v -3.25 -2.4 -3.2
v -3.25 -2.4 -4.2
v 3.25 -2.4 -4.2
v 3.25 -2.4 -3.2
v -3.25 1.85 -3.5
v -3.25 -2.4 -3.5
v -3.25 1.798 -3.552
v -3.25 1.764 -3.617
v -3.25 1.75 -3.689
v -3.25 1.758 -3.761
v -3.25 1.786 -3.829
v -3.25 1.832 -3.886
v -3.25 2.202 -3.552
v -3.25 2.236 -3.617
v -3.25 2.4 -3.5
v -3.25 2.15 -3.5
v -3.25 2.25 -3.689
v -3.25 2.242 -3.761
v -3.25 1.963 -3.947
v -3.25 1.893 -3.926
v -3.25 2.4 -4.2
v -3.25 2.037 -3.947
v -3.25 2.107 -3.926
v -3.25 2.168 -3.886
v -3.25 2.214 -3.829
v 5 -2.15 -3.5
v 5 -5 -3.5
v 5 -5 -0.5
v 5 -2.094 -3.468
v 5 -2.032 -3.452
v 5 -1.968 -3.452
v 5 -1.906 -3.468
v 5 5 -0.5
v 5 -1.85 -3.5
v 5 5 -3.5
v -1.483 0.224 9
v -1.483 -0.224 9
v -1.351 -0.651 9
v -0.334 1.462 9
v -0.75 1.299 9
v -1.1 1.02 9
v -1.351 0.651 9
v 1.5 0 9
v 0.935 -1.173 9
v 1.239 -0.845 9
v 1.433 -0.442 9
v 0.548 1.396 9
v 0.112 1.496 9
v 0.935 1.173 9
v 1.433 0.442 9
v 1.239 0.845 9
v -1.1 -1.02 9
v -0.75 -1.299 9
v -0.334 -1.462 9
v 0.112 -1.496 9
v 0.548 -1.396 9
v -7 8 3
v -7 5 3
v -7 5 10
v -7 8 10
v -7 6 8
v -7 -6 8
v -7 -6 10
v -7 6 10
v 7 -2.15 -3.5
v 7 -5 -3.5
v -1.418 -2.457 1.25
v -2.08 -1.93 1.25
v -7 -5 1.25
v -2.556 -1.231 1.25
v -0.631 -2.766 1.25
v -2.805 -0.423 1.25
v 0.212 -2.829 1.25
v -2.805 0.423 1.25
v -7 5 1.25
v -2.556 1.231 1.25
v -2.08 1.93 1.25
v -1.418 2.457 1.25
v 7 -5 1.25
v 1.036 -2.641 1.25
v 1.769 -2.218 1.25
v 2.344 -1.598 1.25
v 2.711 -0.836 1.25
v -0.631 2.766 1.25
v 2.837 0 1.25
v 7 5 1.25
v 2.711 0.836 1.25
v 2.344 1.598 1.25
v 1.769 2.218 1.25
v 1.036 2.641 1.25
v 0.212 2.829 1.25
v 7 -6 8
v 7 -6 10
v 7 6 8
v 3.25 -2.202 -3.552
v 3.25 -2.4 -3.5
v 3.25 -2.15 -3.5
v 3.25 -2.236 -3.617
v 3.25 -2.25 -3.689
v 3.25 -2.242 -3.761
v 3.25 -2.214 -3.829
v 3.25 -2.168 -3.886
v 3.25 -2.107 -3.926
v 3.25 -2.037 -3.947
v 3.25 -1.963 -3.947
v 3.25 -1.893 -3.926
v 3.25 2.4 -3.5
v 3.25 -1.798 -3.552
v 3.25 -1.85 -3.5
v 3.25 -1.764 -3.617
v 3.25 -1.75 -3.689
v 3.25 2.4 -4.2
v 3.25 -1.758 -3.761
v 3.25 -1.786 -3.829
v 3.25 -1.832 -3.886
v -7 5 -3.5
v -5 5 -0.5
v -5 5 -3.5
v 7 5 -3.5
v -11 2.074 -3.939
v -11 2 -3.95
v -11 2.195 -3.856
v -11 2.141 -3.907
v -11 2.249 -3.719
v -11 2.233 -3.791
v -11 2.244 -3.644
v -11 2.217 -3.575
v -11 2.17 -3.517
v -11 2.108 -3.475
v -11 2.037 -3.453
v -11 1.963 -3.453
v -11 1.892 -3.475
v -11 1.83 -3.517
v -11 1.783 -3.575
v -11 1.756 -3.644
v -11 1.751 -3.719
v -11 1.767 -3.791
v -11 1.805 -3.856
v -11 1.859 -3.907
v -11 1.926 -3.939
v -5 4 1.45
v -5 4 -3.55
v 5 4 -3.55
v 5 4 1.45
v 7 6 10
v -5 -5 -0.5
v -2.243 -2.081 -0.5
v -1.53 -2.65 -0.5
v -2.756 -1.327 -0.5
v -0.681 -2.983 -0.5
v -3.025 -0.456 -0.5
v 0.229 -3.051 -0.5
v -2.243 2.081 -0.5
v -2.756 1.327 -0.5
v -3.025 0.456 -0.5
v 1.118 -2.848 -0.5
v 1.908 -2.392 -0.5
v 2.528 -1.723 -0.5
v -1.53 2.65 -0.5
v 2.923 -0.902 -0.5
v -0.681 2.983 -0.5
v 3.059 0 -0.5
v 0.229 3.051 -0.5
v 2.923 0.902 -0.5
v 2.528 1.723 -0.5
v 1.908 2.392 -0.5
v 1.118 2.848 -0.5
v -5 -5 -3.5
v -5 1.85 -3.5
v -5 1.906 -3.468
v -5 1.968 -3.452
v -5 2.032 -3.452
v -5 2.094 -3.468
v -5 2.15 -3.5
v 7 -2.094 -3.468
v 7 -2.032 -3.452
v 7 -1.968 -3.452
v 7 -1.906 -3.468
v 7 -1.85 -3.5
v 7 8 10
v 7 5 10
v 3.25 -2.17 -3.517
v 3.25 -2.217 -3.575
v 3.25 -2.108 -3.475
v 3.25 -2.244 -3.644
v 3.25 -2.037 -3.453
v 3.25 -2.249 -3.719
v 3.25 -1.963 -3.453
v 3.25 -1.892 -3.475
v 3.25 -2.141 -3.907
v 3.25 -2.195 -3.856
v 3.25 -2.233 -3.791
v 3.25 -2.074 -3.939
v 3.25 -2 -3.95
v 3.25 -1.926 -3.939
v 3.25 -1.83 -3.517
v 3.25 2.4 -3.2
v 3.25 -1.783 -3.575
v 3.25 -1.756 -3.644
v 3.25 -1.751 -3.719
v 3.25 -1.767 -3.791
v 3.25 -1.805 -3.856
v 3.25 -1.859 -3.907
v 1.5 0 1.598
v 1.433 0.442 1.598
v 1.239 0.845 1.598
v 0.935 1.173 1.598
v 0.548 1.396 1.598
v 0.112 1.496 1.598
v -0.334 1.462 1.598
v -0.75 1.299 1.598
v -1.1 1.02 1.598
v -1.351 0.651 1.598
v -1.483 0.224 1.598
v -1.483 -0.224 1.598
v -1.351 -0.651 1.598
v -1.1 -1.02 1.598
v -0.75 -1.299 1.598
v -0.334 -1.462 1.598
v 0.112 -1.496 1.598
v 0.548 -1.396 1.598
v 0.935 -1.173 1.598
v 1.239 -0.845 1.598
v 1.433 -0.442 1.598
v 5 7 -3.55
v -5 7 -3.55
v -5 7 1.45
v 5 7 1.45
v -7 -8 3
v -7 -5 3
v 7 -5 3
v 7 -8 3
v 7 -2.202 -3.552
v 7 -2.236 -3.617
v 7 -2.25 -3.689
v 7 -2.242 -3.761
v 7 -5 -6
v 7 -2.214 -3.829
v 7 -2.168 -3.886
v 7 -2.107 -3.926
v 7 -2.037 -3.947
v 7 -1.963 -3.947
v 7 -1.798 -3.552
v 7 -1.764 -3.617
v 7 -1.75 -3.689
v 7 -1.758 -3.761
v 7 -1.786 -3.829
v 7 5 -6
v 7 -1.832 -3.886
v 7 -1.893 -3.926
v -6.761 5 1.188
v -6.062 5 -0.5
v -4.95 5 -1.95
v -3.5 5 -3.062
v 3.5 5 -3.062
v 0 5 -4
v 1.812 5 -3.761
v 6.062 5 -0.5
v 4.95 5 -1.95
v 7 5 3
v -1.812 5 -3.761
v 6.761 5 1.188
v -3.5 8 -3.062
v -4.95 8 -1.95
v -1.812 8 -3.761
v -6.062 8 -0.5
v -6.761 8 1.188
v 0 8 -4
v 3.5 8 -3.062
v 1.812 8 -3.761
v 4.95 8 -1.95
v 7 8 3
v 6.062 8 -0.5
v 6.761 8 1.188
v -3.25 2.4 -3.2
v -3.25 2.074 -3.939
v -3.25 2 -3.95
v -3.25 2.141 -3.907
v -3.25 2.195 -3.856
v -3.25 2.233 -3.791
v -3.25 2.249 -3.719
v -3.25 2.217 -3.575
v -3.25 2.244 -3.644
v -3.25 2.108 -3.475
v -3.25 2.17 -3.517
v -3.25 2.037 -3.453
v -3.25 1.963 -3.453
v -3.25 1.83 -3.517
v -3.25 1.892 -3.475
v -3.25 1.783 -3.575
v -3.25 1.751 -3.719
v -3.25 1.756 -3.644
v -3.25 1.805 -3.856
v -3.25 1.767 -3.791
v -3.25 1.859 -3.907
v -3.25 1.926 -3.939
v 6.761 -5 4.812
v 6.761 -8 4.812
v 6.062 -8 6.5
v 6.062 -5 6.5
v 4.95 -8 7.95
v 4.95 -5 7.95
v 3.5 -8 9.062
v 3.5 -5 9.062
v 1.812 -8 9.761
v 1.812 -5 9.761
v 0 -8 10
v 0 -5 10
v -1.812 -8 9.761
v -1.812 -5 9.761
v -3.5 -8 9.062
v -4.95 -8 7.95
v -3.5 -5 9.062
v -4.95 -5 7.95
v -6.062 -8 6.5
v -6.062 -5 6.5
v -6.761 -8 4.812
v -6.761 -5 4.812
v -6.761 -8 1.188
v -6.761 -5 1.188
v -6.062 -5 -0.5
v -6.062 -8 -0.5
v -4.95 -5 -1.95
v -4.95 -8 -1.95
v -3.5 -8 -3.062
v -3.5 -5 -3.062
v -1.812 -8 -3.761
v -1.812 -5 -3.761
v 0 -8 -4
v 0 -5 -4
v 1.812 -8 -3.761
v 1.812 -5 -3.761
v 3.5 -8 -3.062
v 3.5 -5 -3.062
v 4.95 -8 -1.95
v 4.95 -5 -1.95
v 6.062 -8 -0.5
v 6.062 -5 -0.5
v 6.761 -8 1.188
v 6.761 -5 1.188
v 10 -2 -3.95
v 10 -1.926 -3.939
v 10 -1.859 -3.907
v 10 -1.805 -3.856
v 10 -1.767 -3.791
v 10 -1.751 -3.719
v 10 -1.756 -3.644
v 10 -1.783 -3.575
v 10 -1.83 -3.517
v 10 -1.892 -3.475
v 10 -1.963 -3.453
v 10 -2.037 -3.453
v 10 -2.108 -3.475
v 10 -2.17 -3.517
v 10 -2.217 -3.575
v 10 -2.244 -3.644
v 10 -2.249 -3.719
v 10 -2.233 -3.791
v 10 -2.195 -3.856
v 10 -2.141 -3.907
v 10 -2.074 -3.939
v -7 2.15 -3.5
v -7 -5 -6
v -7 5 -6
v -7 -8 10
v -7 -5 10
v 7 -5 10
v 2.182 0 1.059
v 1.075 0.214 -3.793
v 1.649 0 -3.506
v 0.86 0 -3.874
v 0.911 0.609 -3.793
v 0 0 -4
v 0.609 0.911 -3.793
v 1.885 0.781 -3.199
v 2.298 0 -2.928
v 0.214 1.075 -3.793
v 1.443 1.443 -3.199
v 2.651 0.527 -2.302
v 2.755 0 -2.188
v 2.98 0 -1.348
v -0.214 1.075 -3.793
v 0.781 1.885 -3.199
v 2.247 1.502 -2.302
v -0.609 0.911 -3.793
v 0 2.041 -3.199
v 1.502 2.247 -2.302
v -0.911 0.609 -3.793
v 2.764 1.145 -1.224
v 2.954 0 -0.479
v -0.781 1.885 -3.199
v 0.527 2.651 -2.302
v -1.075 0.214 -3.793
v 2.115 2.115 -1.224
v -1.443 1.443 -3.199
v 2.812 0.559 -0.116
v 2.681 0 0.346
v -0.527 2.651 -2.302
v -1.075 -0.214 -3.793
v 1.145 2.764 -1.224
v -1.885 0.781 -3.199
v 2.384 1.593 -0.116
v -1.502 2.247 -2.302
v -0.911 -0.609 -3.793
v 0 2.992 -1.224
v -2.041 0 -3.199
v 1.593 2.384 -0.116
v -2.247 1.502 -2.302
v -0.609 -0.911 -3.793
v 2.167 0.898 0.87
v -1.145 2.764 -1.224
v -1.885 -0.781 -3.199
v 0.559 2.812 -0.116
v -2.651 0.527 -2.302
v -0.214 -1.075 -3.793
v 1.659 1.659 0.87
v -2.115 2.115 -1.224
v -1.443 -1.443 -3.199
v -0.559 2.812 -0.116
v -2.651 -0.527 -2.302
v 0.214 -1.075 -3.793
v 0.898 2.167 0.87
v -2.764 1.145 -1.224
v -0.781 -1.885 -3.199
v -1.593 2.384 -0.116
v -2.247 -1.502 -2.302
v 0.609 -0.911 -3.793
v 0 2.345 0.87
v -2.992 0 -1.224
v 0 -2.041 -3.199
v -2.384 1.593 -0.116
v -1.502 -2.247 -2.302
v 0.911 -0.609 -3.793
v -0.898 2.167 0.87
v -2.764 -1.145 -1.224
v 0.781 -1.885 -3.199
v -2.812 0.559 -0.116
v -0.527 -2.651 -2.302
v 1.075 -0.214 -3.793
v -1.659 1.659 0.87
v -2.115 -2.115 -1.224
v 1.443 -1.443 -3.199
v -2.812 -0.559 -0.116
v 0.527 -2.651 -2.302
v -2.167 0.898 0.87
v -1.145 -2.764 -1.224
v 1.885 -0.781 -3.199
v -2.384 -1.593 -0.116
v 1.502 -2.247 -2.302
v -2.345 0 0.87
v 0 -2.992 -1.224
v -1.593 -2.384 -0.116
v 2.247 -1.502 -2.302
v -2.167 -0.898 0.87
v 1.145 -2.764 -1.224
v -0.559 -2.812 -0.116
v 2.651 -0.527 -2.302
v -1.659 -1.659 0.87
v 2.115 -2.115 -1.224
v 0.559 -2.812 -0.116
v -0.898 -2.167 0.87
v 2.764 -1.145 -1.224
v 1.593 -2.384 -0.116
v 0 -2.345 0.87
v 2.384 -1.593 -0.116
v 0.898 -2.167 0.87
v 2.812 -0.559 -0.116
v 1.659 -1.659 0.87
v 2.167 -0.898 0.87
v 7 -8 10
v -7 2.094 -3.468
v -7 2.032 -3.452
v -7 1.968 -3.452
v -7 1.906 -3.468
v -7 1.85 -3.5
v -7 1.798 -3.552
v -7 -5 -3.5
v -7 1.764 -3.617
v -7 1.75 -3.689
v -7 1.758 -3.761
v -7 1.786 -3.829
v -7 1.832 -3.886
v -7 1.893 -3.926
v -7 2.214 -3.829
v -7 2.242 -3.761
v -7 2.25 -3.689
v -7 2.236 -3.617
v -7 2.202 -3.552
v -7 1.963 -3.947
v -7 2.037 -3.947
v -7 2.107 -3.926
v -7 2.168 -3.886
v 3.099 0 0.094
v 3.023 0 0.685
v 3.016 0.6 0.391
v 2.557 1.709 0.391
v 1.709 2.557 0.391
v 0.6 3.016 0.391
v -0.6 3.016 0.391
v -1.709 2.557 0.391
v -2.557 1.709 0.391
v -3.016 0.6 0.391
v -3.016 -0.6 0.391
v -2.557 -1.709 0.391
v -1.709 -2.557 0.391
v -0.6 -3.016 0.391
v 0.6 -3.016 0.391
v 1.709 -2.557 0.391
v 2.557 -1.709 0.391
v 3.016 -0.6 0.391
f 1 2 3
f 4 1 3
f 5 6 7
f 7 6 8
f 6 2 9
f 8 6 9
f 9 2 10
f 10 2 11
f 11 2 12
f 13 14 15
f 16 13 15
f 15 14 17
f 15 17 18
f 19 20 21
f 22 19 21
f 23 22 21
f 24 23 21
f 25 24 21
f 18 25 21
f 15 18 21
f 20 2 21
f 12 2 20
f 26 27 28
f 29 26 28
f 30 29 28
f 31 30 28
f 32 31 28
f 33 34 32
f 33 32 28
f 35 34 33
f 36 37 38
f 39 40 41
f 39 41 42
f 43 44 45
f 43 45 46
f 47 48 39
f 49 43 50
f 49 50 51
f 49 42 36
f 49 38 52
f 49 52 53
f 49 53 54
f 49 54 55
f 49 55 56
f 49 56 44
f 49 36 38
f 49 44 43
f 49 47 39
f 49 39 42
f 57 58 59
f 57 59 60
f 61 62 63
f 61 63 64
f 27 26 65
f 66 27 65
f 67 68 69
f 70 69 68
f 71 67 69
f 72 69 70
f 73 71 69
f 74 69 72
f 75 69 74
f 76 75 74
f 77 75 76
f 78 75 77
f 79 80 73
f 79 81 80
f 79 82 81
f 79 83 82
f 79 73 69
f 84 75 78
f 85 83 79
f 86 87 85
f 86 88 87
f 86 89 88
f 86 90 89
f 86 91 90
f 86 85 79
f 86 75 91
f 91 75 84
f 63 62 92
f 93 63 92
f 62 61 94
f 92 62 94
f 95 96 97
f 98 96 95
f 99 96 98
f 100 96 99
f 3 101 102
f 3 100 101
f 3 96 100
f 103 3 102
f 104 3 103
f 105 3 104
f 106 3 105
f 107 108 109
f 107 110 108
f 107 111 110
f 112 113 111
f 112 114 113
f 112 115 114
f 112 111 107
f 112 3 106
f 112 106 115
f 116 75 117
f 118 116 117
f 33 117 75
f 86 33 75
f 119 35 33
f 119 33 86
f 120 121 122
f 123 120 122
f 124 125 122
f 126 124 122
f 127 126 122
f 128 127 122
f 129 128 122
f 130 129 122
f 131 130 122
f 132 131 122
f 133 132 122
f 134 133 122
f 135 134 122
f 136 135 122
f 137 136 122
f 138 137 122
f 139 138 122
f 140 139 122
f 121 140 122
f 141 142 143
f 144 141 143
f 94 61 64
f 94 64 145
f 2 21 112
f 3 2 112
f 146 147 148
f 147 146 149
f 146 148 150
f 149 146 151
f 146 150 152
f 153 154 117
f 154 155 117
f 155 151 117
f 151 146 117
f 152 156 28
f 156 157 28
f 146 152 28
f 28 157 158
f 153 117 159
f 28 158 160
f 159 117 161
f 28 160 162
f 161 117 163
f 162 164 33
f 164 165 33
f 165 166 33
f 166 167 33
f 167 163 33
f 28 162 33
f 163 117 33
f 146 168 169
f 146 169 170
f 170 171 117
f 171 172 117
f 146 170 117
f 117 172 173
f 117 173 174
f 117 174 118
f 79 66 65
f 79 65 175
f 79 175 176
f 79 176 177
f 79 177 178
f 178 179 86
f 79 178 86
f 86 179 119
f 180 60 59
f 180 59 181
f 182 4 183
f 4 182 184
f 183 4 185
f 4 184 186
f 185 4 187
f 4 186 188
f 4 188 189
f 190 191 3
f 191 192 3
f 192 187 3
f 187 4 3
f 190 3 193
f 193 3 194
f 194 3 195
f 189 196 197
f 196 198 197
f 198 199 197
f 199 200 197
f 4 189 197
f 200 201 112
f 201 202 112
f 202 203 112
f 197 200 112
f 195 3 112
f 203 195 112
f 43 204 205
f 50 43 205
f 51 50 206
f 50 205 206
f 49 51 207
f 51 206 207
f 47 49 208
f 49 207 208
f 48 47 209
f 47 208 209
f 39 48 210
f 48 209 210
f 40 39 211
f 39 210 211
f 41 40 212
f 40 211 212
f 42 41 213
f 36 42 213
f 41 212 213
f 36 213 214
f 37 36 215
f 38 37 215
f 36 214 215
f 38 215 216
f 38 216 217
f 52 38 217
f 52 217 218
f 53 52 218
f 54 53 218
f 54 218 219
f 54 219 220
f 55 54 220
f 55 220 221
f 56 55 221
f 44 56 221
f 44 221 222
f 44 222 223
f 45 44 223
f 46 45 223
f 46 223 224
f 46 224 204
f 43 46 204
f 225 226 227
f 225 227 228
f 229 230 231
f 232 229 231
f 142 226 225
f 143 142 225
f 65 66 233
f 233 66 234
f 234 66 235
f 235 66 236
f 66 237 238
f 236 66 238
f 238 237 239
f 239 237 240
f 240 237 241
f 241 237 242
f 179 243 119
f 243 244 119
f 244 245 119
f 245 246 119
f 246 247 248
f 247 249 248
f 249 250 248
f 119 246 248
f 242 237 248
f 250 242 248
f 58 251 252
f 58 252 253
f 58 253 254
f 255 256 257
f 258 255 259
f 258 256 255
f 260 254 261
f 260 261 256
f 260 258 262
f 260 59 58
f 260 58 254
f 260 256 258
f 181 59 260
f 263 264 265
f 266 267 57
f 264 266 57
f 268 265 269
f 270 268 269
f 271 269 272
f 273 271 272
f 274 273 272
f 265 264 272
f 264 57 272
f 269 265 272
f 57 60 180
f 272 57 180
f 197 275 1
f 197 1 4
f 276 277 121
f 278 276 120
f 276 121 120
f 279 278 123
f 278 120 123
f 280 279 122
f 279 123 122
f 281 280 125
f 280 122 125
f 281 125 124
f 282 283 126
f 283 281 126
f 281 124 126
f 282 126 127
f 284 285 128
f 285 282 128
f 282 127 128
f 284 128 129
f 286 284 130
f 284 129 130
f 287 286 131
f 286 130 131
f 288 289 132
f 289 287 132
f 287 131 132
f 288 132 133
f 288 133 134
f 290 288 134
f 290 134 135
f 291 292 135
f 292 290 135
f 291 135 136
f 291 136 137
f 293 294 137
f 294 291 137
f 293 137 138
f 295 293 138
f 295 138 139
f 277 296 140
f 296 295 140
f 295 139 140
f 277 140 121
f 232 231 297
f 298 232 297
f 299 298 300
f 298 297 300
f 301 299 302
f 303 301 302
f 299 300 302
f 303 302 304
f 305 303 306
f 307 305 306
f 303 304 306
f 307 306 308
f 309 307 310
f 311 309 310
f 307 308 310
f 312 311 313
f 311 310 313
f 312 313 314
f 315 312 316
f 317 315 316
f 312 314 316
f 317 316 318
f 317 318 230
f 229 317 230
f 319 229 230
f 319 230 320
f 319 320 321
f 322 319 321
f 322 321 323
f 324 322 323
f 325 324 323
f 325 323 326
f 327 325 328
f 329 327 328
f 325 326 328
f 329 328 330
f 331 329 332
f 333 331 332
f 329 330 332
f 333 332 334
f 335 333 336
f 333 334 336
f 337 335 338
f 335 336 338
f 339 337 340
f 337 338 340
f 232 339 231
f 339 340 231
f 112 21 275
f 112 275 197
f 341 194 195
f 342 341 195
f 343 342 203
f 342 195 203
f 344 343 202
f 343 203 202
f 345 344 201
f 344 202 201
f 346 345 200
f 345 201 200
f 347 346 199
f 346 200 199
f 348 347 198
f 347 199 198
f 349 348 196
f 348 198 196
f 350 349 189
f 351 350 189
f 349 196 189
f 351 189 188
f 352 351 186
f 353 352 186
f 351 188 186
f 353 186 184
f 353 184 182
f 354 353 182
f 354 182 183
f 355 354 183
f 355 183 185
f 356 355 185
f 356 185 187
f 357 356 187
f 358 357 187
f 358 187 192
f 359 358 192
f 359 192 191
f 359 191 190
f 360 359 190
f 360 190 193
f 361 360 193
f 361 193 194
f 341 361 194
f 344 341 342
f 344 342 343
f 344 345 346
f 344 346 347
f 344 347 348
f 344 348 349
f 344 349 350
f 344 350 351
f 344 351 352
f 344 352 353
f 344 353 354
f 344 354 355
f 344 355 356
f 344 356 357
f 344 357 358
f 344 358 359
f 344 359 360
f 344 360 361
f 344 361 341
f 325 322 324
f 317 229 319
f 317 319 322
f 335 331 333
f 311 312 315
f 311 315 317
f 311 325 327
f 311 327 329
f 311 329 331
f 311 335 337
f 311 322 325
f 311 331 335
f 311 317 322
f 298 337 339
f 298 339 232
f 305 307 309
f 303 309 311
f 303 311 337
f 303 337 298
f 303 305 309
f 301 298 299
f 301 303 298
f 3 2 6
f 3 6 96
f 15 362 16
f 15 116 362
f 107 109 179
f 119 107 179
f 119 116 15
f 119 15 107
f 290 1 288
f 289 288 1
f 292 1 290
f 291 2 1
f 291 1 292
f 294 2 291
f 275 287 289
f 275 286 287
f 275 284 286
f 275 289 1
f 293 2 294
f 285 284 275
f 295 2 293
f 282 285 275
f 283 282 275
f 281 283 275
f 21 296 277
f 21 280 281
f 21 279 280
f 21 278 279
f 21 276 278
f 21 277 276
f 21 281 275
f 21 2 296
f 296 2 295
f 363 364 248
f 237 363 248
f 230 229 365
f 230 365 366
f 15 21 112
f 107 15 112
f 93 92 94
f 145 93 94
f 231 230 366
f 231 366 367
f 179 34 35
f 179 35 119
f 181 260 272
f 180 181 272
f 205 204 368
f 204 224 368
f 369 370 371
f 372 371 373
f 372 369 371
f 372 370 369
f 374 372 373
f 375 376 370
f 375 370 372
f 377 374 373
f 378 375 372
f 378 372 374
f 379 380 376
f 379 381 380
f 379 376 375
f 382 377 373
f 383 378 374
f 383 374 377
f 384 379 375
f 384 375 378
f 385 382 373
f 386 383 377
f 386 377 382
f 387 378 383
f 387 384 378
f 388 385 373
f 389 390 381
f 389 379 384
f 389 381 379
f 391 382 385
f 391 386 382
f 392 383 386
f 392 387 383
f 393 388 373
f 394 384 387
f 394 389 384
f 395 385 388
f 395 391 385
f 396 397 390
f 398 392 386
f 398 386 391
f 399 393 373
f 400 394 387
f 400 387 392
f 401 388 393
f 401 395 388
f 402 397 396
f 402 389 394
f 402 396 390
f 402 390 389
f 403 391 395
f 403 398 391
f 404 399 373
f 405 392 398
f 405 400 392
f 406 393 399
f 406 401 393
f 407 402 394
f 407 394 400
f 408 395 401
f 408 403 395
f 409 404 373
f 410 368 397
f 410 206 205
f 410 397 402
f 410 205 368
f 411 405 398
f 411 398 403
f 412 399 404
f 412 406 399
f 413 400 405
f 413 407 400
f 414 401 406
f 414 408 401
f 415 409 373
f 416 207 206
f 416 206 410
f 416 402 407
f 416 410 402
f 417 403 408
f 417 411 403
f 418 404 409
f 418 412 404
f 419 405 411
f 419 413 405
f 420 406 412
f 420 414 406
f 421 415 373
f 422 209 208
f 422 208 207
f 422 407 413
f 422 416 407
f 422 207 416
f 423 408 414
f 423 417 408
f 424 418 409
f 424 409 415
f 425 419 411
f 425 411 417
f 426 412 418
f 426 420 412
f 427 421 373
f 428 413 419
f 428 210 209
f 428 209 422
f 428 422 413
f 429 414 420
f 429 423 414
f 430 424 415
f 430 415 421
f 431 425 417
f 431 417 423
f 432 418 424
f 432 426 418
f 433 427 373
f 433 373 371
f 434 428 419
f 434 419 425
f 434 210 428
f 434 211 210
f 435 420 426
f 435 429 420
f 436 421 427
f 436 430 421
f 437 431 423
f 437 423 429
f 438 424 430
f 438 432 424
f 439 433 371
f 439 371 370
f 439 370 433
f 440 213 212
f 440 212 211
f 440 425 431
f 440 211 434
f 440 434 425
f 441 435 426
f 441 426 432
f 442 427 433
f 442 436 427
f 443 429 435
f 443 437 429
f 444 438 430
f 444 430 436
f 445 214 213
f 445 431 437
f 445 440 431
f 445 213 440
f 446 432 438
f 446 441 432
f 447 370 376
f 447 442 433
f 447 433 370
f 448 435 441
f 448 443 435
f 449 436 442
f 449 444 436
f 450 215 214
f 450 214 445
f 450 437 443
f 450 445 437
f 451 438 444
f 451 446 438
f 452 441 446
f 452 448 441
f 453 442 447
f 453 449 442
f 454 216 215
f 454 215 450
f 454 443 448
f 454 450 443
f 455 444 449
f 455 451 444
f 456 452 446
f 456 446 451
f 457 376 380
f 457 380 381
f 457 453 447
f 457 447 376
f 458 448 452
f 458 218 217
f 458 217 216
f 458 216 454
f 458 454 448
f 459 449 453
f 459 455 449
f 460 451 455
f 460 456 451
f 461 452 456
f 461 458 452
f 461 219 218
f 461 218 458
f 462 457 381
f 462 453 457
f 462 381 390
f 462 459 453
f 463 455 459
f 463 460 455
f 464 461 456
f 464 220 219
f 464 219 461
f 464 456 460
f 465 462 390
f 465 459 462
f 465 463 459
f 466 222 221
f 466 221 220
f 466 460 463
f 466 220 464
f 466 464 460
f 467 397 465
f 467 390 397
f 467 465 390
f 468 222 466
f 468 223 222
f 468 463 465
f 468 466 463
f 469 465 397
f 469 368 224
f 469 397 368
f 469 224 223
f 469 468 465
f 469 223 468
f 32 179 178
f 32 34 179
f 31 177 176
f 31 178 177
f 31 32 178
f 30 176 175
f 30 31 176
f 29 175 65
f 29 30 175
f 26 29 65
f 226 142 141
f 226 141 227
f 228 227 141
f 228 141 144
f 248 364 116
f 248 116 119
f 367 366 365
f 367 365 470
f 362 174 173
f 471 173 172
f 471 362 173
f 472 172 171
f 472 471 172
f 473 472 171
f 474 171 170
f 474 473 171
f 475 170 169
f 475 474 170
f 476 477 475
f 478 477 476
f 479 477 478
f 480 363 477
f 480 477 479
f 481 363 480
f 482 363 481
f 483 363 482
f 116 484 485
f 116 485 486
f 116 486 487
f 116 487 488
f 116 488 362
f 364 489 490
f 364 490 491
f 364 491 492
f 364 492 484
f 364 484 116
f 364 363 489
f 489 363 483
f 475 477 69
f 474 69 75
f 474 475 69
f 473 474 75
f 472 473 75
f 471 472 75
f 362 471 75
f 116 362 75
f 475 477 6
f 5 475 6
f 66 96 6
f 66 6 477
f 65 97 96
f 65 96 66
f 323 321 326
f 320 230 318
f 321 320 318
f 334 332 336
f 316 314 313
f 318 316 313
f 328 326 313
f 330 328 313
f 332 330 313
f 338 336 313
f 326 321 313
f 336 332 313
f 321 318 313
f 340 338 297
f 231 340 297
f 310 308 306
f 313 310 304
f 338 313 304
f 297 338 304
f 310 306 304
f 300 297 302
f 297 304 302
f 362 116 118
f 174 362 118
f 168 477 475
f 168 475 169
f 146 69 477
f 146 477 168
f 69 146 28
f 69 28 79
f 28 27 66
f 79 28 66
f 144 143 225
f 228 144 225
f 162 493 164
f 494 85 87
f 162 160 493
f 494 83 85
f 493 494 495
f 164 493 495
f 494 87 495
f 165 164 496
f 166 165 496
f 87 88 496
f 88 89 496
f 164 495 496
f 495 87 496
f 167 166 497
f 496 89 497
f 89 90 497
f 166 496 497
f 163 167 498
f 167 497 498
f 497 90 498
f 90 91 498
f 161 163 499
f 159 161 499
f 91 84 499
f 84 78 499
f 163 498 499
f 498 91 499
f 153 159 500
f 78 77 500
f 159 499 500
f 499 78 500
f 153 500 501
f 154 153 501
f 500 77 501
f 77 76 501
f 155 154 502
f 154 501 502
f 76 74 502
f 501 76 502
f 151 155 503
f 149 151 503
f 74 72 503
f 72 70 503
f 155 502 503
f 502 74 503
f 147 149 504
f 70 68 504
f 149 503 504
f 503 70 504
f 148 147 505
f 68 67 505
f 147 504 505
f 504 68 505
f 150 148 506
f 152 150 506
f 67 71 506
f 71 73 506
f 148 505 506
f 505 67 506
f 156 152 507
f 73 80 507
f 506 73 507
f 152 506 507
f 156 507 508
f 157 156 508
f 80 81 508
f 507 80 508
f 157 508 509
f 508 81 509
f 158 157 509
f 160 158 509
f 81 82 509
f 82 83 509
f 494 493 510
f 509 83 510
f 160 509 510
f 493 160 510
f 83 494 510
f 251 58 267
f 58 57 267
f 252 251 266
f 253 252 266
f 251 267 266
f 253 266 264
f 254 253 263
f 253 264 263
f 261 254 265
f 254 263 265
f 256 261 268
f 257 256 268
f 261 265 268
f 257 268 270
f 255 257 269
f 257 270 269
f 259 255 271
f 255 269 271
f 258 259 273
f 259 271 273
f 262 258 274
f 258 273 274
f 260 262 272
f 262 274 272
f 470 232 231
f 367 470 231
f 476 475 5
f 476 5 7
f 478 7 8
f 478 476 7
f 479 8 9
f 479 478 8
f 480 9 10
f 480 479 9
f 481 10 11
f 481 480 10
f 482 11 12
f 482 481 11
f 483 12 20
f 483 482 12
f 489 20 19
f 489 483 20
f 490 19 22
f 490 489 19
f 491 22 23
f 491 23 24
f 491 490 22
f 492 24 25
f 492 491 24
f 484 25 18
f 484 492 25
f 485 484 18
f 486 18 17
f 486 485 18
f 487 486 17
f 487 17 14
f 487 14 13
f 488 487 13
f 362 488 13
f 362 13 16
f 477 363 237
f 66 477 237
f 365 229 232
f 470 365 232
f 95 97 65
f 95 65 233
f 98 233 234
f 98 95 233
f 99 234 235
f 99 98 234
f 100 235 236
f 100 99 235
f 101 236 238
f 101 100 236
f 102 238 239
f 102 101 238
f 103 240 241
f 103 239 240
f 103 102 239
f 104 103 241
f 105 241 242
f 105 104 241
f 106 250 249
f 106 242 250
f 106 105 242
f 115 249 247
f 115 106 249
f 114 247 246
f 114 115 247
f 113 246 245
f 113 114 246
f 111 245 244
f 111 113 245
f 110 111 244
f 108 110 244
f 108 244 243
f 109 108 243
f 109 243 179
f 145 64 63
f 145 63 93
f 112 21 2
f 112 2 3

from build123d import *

# Parameters (mm, degrees)
CYLINDER002_R           = 0.25
CYLINDER002_DEPTH       = 10
CYLINDER002_PITCH_ANGLE = 90
CYLINDER001_R           = 0.25
CYLINDER001_DEPTH       = 10
CYLINDER001_PITCH_ANGLE = 90
BOX_W                   = 6.5
BOX_H                   = 4.8
BOX_DEPTH               = 1
BOX004_W                = 10
BOX004_H                = 3
BOX004_DEPTH            = 5
CYLINDER_R              = 1.5
CYLINDER_DEPTH          = 10
BOX005_W                = 21
BOX005_H                = 17
BOX005_DEPTH            = 8
CYLINDER005_R           = 2.5
CYLINDER005_DEPTH       = 10
CYLINDER004_R           = 0.25
CYLINDER004_DEPTH       = 10
CYLINDER004_PITCH_ANGLE = 90
CYLINDER003_R           = 0.25
CYLINDER003_DEPTH       = 10
CYLINDER003_PITCH_ANGLE = 90
BOX002_W                = 6.5
BOX002_H                = 4.8
BOX002_DEPTH            = 1
BOX003_W                = 10
BOX003_H                = 12
BOX003_DEPTH            = 3
BOX001_W                = 14
BOX001_H                = 10
BOX001_DEPTH            = 7.25
BOX006_W                = 21
BOX006_H                = 17
BOX006_DEPTH            = 12
CYLINDER006_R           = 7
CYLINDER006_DEPTH       = 3
CYLINDER006_ROLL_ANGLE  = 90
BOX007_W                = 14
BOX007_H                = 3
BOX007_DEPTH            = 7
BOX008_W                = 14
BOX008_H                = 3
BOX008_DEPTH            = 7
CYLINDER007_R           = 7
CYLINDER007_DEPTH       = 3
CYLINDER007_ROLL_ANGLE  = 90
BOX009_W                = 14
BOX009_H                = 12
BOX009_DEPTH            = 2


with BuildPart() as cylinder002:
    # Cylinder002 → Cylinder002 (new body)
    with BuildSketch(Plane.XY):
        Circle(CYLINDER002_R)
    extrude(amount=CYLINDER002_DEPTH)


with BuildPart() as cylinder002_1:
    # Cylinder002 pitch: moved
    add(cylinder002.part.rotate(Axis((0, 0, 0), (0, 1, 0)), CYLINDER002_PITCH_ANGLE))


with BuildPart() as cylinder002_2:
    # Cylinder002 placement: moved
    add(cylinder002_1.part.moved(Location((0, -2, -3.7))))


with BuildPart() as fusion002:
    # Cylinder001 → Cylinder001 (new body)
    with BuildSketch(Plane.XY):
        Circle(CYLINDER001_R)
    extrude(amount=CYLINDER001_DEPTH)


with BuildPart() as fusion002_1:
    # Cylinder001 pitch: moved
    add(fusion002.part.rotate(Axis((0, 0, 0), (0, 1, 0)), CYLINDER001_PITCH_ANGLE))


with BuildPart() as fusion002_2:
    # Cylinder001 placement: moved
    add(fusion002_1.part.moved(Location((-11, 2, -3.7))))

    # Fusion002: union Cylinder002
    add(cylinder002_2.part)


with BuildPart() as switch:
    # Box → Box (new body)
    with BuildSketch(Plane(origin=(-3.25, -2.4, -4.2), x_dir=(1, 0, 0), z_dir=(0, 0, 1))):
        with Locations((3.25, 2.4)):
            Rectangle(BOX_W, BOX_H)
    extrude(amount=BOX_DEPTH)

    # Fusion003: union Fusion002
    add(fusion002_2.part)


with BuildPart() as cube004:
    # Box004 → Box004 (new body)
    with BuildSketch(Plane(origin=(-5, 4, -3.55), x_dir=(1, 0, 0), z_dir=(0, 0, 1))):
        with Locations((5, 1.5)):
            Rectangle(BOX004_W, BOX004_H)
    extrude(amount=BOX004_DEPTH)


with BuildPart() as cylinder:
    # Cylinder → Cylinder (new body)
    with BuildSketch(Plane.XY):
        Circle(CYLINDER_R)
    extrude(amount=CYLINDER_DEPTH)


with BuildPart() as ball_and_screw:
    # Sphere → Sphere (revolve)
    with BuildSketch(Plane.XZ):
        with BuildLine():
            ThreePointArc((0, -3), (3, 0), (0, 3))
            Line((0, 3), (0, -3))
        make_face()
    revolve(axis=Axis((0, 0, 0), (0, 0, 1)))

    # Fusion005: union Cylinder
    add(cylinder.part)


with BuildPart() as ball_and_screw_1:
    # Fusion005 placement: moved
    add(ball_and_screw.part.moved(Location((0, 0, -1))))


with BuildPart() as cube005:
    # Box005 → Box005 (new body)
    with BuildSketch(Plane(origin=(-9, -7, -3.5), x_dir=(1, 0, 0), z_dir=(0, 0, 1))):
        with Locations((10.5, 8.5)):
            Rectangle(BOX005_W, BOX005_H)
    extrude(amount=BOX005_DEPTH)


with BuildPart() as cylinder005:
    # Cylinder005 → Cylinder005 (new body)
    with BuildSketch(Plane.XY.offset(0.5)):
        Circle(CYLINDER005_R)
    extrude(amount=CYLINDER005_DEPTH)


with BuildPart() as fusion004:
    # Sphere001 → Sphere001 (revolve)
    with BuildSketch(Plane.XZ):
        with BuildLine():
            ThreePointArc((0, -3.1), (3.1, 0), (0, 3.1))
            Line((0, 3.1), (0, -3.1))
        make_face()
    revolve(axis=Axis((0, 0, 0), (0, 0, 1)))

    # Fusion004: union Cylinder005
    add(cylinder005.part)


with BuildPart() as cylinder004:
    # Cylinder004 → Cylinder004 (new body)
    with BuildSketch(Plane.XY):
        Circle(CYLINDER004_R)
    extrude(amount=CYLINDER004_DEPTH)


with BuildPart() as cylinder004_1:
    # Cylinder004 pitch: moved
    add(cylinder004.part.rotate(Axis((0, 0, 0), (0, 1, 0)), CYLINDER004_PITCH_ANGLE))


with BuildPart() as cylinder004_2:
    # Cylinder004 placement: moved
    add(cylinder004_1.part.moved(Location((0, -2, -3.7))))


with BuildPart() as fusion:
    # Cylinder003 → Cylinder003 (new body)
    with BuildSketch(Plane.XY):
        Circle(CYLINDER003_R)
    extrude(amount=CYLINDER003_DEPTH)


with BuildPart() as fusion_1:
    # Cylinder003 pitch: moved
    add(fusion.part.rotate(Axis((0, 0, 0), (0, 1, 0)), CYLINDER003_PITCH_ANGLE))


with BuildPart() as fusion_2:
    # Cylinder003 placement: moved
    add(fusion_1.part.moved(Location((-11, 2, -3.7))))

    # Fusion: union Cylinder004
    add(cylinder004_2.part)


with BuildPart() as fusion001:
    # Box002 → Box002 (new body)
    with BuildSketch(Plane(origin=(-3.25, -2.4, -4.2), x_dir=(1, 0, 0), z_dir=(0, 0, 1))):
        with Locations((3.25, 2.4)):
            Rectangle(BOX002_W, BOX002_H)
    extrude(amount=BOX002_DEPTH)

    # Fusion001: union Fusion
    add(fusion_2.part)


with BuildPart() as cube003:
    # Box003 → Box003 (new body)
    with BuildSketch(Plane(origin=(-5, -6, -3.5), x_dir=(1, 0, 0), z_dir=(0, 0, 1))):
        with Locations((5, 6)):
            Rectangle(BOX003_W, BOX003_H)
    extrude(amount=BOX003_DEPTH)


with BuildPart() as cut001:
    # Box001 → Box001 (new body)
    with BuildSketch(Plane(origin=(-7, -5, -6), x_dir=(1, 0, 0), z_dir=(0, 0, 1))):
        with Locations((7, 5)):
            Rectangle(BOX001_W, BOX001_H)
    extrude(amount=BOX001_DEPTH)

    # Cut: cut Cube003
    add(cube003.part, mode=Mode.SUBTRACT)

    # Cut001: cut Fusion001
    add(fusion001.part, mode=Mode.SUBTRACT)


with BuildPart() as bottom_switch_holder:
    # Cut003 base: copy of Cut001
    add(cut001.part)

    # Cut003: cut Fusion004
    add(fusion004.part, mode=Mode.SUBTRACT)

    # Cut004: cut Cube005
    add(cube005.part, mode=Mode.SUBTRACT)


with BuildPart() as cube006:
    # Box006 → Box006 (new body)
    with BuildSketch(Plane(origin=(-9, -7, -3.5), x_dir=(1, 0, 0), z_dir=(0, 0, 1))):
        with Locations((10.5, 8.5)):
            Rectangle(BOX006_W, BOX006_H)
    extrude(amount=BOX006_DEPTH)


with BuildPart() as ball_and_screw_holder:
    # Cut002 base: copy of Cut001
    add(cut001.part)

    # Cut002: cut Fusion004
    add(fusion004.part, mode=Mode.SUBTRACT)

    # Common: intersect Cube006
    add(cube006.part, mode=Mode.INTERSECT)


with BuildPart() as cylinder006:
    # Cylinder006 → Cylinder006 (new body)
    with BuildSketch(Plane.XY):
        Circle(CYLINDER006_R)
    extrude(amount=CYLINDER006_DEPTH)


with BuildPart() as cylinder006_1:
    # Cylinder006 roll: moved
    add(cylinder006.part.rotate(Axis((0, 0, 0), (1, 0, 0)), CYLINDER006_ROLL_ANGLE))


with BuildPart() as cylinder006_2:
    # Cylinder006 placement: moved
    add(cylinder006_1.part.moved(Location((0, 8, 3))))


with BuildPart() as fusion006:
    # Box007 → Box007 (new body)
    with BuildSketch(Plane(origin=(-7, 5, 3), x_dir=(1, 0, 0), z_dir=(0, 0, 1))):
        with Locations((7, 1.5)):
            Rectangle(BOX007_W, BOX007_H)
    extrude(amount=BOX007_DEPTH)

    # Fusion006: union Cylinder006
    add(cylinder006_2.part)


with BuildPart() as cube008:
    # Box008 → Box008 (new body)
    with BuildSketch(Plane(origin=(-7, -8, 3), x_dir=(1, 0, 0), z_dir=(0, 0, 1))):
        with Locations((7, 1.5)):
            Rectangle(BOX008_W, BOX008_H)
    extrude(amount=BOX008_DEPTH)


with BuildPart() as cylinder007:
    # Cylinder007 → Cylinder007 (new body)
    with BuildSketch(Plane.XY):
        Circle(CYLINDER007_R)
    extrude(amount=CYLINDER007_DEPTH)


with BuildPart() as cylinder007_1:
    # Cylinder007 roll: moved
    add(cylinder007.part.rotate(Axis((0, 0, 0), (1, 0, 0)), CYLINDER007_ROLL_ANGLE))


with BuildPart() as cylinder007_2:
    # Cylinder007 placement: moved
    add(cylinder007_1.part.moved(Location((0, -5, 3))))


with BuildPart() as cube009:
    # Box009 → Box009 (new body)
    with BuildSketch(Plane(origin=(-7, -6, 8), x_dir=(1, 0, 0), z_dir=(0, 0, 1))):
        with Locations((7, 6)):
            Rectangle(BOX009_W, BOX009_H)
    extrude(amount=BOX009_DEPTH)


solid = Compound([switch.part, cube004.part, ball_and_screw_1.part, bottom_switch_holder.part, ball_and_screw_holder.part, fusion006.part, cube008.part, cylinder007_2.part, cube009.part])
